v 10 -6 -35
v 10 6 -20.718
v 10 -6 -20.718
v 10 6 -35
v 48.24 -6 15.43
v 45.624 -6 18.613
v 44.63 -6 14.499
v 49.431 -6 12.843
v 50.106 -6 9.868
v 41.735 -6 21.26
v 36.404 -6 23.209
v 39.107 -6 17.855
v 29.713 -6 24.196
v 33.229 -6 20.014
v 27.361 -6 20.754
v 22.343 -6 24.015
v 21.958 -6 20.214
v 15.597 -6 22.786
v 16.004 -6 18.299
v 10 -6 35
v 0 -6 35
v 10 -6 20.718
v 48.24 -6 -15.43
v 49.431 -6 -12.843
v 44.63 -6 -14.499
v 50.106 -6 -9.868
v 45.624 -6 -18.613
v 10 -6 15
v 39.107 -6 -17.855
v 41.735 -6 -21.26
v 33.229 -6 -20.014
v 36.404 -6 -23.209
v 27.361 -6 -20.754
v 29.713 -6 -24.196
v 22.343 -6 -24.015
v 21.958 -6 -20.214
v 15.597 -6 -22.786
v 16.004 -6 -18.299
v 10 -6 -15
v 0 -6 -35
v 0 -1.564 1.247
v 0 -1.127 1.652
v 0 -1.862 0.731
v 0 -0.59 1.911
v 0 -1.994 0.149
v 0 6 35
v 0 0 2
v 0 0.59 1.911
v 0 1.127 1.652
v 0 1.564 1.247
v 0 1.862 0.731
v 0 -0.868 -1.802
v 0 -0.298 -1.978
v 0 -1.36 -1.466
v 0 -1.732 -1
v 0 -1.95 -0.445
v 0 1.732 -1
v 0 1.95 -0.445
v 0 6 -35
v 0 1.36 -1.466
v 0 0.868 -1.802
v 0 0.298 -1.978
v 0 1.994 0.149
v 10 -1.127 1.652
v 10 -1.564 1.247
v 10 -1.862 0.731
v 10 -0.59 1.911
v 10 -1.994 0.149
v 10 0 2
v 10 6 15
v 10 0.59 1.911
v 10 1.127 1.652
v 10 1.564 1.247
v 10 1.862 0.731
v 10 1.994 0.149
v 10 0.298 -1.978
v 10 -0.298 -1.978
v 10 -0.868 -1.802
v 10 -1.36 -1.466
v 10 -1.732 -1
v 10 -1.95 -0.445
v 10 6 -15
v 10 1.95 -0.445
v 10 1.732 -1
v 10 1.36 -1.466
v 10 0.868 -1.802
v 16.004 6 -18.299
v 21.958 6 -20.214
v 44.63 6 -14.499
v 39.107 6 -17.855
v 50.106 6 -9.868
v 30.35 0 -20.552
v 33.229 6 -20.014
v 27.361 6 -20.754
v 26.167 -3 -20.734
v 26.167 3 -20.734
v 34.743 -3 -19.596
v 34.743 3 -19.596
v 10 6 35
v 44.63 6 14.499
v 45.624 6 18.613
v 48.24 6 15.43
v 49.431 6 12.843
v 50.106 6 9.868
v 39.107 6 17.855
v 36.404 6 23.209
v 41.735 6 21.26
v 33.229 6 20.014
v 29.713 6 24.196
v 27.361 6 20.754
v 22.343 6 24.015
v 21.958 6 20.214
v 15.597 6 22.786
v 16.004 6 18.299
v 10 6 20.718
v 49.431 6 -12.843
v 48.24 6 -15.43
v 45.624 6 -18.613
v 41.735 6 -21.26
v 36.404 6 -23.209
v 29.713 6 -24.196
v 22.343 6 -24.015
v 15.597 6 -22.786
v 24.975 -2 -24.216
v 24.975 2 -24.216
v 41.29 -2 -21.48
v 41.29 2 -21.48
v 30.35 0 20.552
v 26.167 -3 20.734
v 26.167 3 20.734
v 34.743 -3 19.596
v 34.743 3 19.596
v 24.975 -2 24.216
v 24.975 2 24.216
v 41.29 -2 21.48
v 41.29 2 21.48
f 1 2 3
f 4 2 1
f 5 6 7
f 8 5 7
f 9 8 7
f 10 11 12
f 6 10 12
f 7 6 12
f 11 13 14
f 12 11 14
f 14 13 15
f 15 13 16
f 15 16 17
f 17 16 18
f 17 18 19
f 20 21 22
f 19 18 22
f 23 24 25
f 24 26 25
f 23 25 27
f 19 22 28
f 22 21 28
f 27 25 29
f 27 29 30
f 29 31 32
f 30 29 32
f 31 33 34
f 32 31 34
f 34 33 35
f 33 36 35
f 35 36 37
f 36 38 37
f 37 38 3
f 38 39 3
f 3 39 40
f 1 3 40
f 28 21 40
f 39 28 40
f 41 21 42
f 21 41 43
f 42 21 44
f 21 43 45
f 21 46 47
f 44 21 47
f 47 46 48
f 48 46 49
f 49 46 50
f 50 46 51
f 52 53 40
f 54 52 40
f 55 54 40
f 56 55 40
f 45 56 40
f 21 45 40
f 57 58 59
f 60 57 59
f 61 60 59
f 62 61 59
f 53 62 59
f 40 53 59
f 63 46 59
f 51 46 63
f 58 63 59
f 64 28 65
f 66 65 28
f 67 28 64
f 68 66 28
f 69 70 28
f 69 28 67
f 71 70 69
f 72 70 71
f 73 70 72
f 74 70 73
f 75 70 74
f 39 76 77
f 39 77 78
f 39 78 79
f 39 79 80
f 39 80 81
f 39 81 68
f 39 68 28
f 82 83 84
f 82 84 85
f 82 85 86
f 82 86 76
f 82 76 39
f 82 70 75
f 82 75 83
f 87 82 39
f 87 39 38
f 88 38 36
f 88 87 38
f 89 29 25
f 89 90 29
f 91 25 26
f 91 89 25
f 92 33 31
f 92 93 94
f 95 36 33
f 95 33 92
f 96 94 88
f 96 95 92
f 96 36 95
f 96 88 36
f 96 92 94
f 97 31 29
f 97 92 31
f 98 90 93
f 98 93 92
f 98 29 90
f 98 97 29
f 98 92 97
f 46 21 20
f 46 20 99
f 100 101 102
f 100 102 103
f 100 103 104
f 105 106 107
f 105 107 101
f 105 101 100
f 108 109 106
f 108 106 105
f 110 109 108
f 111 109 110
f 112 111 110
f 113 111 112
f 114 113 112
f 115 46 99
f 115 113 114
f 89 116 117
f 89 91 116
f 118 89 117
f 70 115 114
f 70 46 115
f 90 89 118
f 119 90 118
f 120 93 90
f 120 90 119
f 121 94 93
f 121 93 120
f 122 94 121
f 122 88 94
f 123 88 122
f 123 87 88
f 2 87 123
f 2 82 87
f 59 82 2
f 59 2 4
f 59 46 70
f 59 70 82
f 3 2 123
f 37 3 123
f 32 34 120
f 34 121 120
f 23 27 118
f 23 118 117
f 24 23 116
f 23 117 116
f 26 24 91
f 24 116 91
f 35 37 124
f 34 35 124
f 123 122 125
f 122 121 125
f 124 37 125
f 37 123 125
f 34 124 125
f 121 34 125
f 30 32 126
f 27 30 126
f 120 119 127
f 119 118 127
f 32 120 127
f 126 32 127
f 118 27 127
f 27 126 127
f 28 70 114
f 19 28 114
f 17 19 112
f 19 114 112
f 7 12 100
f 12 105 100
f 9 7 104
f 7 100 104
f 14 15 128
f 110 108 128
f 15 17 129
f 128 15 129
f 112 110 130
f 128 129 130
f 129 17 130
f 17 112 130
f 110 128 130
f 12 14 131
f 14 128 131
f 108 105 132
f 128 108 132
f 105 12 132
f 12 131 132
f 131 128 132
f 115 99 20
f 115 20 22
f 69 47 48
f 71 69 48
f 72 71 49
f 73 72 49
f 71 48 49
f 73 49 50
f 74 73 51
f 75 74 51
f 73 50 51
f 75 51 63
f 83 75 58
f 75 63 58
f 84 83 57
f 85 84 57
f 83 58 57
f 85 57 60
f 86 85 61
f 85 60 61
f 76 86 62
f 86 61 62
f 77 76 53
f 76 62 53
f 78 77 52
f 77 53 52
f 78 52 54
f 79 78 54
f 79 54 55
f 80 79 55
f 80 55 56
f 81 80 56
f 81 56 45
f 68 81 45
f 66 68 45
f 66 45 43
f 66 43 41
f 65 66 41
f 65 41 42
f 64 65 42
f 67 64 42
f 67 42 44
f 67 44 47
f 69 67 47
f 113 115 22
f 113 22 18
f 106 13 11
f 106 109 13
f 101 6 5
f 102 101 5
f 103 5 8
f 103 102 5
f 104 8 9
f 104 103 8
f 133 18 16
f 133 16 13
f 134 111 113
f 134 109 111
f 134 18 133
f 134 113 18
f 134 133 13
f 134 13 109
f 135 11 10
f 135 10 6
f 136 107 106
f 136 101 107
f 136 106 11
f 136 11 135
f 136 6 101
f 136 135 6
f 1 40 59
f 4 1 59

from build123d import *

# Parameters (mm, degrees)
SKETCH1_W           = 70
SKETCH1_H           = 12
BOSS_EXTRUDE1_DEPTH = 10
BOSS_EXTRUDE2_DEPTH = 12
SKETCH3_R           = 2
CUT_EXTRUDE1_DEPTH  = 12


with BuildPart() as part:
    # Sketch1 → Boss-Extrude1 (new body)
    with BuildSketch(Plane(origin=(0, 0, 0), x_dir=(0, 0, -1), z_dir=(1, 0, 0))):
        Rectangle(SKETCH1_W, SKETCH1_H)
    extrude(amount=BOSS_EXTRUDE1_DEPTH)

    # Sketch2 → Boss-Extrude2 (add)
    with BuildSketch(Plane(origin=(0, 6, 0), x_dir=(1, 0, 0), z_dir=(0, 1, 0))):
        with BuildLine():
            add(Edge.make_bspline(
                [(10, -15), (30.647953976, -28.668903478), (50.105658194, -9.868255971)],
                knots=[0, 0, 0, 1, 1, 1], degree=2))
            Line((10, -15), (10, -20.717636889))
            add(Edge.make_bspline(
                [(10, -20.717636889), (21.360270844, -26.451655212), (47.984708218, -26.799299217), (50.105658194, -9.868255971)],
                knots=[0, 0, 0, 0, 1, 1, 1, 1], degree=3))
        make_face()
        with BuildLine():
            Line((10, 20.717636889), (10, 15))
            add(Edge.make_bspline(
                [(10, 15), (30.647953976, 28.668903478), (50.105658194, 9.868255971)],
                knots=[0, 0, 0, 1, 1, 1], degree=2))
            add(Edge.make_bspline(
                [(10, 20.717636889), (21.360270844, 26.451655212), (47.984708218, 26.799299217), (50.105658194, 9.868255971)],
                knots=[0, 0, 0, 0, 1, 1, 1, 1], degree=3))
        make_face()
    extrude(amount=-BOSS_EXTRUDE2_DEPTH)

    # Sketch3 → Cut-Extrude1 (cut)
    with BuildSketch(Plane.ZY):
        Circle(SKETCH3_R)
    extrude(amount=-CUT_EXTRUDE1_DEPTH, mode=Mode.SUBTRACT)


solid = part.part
